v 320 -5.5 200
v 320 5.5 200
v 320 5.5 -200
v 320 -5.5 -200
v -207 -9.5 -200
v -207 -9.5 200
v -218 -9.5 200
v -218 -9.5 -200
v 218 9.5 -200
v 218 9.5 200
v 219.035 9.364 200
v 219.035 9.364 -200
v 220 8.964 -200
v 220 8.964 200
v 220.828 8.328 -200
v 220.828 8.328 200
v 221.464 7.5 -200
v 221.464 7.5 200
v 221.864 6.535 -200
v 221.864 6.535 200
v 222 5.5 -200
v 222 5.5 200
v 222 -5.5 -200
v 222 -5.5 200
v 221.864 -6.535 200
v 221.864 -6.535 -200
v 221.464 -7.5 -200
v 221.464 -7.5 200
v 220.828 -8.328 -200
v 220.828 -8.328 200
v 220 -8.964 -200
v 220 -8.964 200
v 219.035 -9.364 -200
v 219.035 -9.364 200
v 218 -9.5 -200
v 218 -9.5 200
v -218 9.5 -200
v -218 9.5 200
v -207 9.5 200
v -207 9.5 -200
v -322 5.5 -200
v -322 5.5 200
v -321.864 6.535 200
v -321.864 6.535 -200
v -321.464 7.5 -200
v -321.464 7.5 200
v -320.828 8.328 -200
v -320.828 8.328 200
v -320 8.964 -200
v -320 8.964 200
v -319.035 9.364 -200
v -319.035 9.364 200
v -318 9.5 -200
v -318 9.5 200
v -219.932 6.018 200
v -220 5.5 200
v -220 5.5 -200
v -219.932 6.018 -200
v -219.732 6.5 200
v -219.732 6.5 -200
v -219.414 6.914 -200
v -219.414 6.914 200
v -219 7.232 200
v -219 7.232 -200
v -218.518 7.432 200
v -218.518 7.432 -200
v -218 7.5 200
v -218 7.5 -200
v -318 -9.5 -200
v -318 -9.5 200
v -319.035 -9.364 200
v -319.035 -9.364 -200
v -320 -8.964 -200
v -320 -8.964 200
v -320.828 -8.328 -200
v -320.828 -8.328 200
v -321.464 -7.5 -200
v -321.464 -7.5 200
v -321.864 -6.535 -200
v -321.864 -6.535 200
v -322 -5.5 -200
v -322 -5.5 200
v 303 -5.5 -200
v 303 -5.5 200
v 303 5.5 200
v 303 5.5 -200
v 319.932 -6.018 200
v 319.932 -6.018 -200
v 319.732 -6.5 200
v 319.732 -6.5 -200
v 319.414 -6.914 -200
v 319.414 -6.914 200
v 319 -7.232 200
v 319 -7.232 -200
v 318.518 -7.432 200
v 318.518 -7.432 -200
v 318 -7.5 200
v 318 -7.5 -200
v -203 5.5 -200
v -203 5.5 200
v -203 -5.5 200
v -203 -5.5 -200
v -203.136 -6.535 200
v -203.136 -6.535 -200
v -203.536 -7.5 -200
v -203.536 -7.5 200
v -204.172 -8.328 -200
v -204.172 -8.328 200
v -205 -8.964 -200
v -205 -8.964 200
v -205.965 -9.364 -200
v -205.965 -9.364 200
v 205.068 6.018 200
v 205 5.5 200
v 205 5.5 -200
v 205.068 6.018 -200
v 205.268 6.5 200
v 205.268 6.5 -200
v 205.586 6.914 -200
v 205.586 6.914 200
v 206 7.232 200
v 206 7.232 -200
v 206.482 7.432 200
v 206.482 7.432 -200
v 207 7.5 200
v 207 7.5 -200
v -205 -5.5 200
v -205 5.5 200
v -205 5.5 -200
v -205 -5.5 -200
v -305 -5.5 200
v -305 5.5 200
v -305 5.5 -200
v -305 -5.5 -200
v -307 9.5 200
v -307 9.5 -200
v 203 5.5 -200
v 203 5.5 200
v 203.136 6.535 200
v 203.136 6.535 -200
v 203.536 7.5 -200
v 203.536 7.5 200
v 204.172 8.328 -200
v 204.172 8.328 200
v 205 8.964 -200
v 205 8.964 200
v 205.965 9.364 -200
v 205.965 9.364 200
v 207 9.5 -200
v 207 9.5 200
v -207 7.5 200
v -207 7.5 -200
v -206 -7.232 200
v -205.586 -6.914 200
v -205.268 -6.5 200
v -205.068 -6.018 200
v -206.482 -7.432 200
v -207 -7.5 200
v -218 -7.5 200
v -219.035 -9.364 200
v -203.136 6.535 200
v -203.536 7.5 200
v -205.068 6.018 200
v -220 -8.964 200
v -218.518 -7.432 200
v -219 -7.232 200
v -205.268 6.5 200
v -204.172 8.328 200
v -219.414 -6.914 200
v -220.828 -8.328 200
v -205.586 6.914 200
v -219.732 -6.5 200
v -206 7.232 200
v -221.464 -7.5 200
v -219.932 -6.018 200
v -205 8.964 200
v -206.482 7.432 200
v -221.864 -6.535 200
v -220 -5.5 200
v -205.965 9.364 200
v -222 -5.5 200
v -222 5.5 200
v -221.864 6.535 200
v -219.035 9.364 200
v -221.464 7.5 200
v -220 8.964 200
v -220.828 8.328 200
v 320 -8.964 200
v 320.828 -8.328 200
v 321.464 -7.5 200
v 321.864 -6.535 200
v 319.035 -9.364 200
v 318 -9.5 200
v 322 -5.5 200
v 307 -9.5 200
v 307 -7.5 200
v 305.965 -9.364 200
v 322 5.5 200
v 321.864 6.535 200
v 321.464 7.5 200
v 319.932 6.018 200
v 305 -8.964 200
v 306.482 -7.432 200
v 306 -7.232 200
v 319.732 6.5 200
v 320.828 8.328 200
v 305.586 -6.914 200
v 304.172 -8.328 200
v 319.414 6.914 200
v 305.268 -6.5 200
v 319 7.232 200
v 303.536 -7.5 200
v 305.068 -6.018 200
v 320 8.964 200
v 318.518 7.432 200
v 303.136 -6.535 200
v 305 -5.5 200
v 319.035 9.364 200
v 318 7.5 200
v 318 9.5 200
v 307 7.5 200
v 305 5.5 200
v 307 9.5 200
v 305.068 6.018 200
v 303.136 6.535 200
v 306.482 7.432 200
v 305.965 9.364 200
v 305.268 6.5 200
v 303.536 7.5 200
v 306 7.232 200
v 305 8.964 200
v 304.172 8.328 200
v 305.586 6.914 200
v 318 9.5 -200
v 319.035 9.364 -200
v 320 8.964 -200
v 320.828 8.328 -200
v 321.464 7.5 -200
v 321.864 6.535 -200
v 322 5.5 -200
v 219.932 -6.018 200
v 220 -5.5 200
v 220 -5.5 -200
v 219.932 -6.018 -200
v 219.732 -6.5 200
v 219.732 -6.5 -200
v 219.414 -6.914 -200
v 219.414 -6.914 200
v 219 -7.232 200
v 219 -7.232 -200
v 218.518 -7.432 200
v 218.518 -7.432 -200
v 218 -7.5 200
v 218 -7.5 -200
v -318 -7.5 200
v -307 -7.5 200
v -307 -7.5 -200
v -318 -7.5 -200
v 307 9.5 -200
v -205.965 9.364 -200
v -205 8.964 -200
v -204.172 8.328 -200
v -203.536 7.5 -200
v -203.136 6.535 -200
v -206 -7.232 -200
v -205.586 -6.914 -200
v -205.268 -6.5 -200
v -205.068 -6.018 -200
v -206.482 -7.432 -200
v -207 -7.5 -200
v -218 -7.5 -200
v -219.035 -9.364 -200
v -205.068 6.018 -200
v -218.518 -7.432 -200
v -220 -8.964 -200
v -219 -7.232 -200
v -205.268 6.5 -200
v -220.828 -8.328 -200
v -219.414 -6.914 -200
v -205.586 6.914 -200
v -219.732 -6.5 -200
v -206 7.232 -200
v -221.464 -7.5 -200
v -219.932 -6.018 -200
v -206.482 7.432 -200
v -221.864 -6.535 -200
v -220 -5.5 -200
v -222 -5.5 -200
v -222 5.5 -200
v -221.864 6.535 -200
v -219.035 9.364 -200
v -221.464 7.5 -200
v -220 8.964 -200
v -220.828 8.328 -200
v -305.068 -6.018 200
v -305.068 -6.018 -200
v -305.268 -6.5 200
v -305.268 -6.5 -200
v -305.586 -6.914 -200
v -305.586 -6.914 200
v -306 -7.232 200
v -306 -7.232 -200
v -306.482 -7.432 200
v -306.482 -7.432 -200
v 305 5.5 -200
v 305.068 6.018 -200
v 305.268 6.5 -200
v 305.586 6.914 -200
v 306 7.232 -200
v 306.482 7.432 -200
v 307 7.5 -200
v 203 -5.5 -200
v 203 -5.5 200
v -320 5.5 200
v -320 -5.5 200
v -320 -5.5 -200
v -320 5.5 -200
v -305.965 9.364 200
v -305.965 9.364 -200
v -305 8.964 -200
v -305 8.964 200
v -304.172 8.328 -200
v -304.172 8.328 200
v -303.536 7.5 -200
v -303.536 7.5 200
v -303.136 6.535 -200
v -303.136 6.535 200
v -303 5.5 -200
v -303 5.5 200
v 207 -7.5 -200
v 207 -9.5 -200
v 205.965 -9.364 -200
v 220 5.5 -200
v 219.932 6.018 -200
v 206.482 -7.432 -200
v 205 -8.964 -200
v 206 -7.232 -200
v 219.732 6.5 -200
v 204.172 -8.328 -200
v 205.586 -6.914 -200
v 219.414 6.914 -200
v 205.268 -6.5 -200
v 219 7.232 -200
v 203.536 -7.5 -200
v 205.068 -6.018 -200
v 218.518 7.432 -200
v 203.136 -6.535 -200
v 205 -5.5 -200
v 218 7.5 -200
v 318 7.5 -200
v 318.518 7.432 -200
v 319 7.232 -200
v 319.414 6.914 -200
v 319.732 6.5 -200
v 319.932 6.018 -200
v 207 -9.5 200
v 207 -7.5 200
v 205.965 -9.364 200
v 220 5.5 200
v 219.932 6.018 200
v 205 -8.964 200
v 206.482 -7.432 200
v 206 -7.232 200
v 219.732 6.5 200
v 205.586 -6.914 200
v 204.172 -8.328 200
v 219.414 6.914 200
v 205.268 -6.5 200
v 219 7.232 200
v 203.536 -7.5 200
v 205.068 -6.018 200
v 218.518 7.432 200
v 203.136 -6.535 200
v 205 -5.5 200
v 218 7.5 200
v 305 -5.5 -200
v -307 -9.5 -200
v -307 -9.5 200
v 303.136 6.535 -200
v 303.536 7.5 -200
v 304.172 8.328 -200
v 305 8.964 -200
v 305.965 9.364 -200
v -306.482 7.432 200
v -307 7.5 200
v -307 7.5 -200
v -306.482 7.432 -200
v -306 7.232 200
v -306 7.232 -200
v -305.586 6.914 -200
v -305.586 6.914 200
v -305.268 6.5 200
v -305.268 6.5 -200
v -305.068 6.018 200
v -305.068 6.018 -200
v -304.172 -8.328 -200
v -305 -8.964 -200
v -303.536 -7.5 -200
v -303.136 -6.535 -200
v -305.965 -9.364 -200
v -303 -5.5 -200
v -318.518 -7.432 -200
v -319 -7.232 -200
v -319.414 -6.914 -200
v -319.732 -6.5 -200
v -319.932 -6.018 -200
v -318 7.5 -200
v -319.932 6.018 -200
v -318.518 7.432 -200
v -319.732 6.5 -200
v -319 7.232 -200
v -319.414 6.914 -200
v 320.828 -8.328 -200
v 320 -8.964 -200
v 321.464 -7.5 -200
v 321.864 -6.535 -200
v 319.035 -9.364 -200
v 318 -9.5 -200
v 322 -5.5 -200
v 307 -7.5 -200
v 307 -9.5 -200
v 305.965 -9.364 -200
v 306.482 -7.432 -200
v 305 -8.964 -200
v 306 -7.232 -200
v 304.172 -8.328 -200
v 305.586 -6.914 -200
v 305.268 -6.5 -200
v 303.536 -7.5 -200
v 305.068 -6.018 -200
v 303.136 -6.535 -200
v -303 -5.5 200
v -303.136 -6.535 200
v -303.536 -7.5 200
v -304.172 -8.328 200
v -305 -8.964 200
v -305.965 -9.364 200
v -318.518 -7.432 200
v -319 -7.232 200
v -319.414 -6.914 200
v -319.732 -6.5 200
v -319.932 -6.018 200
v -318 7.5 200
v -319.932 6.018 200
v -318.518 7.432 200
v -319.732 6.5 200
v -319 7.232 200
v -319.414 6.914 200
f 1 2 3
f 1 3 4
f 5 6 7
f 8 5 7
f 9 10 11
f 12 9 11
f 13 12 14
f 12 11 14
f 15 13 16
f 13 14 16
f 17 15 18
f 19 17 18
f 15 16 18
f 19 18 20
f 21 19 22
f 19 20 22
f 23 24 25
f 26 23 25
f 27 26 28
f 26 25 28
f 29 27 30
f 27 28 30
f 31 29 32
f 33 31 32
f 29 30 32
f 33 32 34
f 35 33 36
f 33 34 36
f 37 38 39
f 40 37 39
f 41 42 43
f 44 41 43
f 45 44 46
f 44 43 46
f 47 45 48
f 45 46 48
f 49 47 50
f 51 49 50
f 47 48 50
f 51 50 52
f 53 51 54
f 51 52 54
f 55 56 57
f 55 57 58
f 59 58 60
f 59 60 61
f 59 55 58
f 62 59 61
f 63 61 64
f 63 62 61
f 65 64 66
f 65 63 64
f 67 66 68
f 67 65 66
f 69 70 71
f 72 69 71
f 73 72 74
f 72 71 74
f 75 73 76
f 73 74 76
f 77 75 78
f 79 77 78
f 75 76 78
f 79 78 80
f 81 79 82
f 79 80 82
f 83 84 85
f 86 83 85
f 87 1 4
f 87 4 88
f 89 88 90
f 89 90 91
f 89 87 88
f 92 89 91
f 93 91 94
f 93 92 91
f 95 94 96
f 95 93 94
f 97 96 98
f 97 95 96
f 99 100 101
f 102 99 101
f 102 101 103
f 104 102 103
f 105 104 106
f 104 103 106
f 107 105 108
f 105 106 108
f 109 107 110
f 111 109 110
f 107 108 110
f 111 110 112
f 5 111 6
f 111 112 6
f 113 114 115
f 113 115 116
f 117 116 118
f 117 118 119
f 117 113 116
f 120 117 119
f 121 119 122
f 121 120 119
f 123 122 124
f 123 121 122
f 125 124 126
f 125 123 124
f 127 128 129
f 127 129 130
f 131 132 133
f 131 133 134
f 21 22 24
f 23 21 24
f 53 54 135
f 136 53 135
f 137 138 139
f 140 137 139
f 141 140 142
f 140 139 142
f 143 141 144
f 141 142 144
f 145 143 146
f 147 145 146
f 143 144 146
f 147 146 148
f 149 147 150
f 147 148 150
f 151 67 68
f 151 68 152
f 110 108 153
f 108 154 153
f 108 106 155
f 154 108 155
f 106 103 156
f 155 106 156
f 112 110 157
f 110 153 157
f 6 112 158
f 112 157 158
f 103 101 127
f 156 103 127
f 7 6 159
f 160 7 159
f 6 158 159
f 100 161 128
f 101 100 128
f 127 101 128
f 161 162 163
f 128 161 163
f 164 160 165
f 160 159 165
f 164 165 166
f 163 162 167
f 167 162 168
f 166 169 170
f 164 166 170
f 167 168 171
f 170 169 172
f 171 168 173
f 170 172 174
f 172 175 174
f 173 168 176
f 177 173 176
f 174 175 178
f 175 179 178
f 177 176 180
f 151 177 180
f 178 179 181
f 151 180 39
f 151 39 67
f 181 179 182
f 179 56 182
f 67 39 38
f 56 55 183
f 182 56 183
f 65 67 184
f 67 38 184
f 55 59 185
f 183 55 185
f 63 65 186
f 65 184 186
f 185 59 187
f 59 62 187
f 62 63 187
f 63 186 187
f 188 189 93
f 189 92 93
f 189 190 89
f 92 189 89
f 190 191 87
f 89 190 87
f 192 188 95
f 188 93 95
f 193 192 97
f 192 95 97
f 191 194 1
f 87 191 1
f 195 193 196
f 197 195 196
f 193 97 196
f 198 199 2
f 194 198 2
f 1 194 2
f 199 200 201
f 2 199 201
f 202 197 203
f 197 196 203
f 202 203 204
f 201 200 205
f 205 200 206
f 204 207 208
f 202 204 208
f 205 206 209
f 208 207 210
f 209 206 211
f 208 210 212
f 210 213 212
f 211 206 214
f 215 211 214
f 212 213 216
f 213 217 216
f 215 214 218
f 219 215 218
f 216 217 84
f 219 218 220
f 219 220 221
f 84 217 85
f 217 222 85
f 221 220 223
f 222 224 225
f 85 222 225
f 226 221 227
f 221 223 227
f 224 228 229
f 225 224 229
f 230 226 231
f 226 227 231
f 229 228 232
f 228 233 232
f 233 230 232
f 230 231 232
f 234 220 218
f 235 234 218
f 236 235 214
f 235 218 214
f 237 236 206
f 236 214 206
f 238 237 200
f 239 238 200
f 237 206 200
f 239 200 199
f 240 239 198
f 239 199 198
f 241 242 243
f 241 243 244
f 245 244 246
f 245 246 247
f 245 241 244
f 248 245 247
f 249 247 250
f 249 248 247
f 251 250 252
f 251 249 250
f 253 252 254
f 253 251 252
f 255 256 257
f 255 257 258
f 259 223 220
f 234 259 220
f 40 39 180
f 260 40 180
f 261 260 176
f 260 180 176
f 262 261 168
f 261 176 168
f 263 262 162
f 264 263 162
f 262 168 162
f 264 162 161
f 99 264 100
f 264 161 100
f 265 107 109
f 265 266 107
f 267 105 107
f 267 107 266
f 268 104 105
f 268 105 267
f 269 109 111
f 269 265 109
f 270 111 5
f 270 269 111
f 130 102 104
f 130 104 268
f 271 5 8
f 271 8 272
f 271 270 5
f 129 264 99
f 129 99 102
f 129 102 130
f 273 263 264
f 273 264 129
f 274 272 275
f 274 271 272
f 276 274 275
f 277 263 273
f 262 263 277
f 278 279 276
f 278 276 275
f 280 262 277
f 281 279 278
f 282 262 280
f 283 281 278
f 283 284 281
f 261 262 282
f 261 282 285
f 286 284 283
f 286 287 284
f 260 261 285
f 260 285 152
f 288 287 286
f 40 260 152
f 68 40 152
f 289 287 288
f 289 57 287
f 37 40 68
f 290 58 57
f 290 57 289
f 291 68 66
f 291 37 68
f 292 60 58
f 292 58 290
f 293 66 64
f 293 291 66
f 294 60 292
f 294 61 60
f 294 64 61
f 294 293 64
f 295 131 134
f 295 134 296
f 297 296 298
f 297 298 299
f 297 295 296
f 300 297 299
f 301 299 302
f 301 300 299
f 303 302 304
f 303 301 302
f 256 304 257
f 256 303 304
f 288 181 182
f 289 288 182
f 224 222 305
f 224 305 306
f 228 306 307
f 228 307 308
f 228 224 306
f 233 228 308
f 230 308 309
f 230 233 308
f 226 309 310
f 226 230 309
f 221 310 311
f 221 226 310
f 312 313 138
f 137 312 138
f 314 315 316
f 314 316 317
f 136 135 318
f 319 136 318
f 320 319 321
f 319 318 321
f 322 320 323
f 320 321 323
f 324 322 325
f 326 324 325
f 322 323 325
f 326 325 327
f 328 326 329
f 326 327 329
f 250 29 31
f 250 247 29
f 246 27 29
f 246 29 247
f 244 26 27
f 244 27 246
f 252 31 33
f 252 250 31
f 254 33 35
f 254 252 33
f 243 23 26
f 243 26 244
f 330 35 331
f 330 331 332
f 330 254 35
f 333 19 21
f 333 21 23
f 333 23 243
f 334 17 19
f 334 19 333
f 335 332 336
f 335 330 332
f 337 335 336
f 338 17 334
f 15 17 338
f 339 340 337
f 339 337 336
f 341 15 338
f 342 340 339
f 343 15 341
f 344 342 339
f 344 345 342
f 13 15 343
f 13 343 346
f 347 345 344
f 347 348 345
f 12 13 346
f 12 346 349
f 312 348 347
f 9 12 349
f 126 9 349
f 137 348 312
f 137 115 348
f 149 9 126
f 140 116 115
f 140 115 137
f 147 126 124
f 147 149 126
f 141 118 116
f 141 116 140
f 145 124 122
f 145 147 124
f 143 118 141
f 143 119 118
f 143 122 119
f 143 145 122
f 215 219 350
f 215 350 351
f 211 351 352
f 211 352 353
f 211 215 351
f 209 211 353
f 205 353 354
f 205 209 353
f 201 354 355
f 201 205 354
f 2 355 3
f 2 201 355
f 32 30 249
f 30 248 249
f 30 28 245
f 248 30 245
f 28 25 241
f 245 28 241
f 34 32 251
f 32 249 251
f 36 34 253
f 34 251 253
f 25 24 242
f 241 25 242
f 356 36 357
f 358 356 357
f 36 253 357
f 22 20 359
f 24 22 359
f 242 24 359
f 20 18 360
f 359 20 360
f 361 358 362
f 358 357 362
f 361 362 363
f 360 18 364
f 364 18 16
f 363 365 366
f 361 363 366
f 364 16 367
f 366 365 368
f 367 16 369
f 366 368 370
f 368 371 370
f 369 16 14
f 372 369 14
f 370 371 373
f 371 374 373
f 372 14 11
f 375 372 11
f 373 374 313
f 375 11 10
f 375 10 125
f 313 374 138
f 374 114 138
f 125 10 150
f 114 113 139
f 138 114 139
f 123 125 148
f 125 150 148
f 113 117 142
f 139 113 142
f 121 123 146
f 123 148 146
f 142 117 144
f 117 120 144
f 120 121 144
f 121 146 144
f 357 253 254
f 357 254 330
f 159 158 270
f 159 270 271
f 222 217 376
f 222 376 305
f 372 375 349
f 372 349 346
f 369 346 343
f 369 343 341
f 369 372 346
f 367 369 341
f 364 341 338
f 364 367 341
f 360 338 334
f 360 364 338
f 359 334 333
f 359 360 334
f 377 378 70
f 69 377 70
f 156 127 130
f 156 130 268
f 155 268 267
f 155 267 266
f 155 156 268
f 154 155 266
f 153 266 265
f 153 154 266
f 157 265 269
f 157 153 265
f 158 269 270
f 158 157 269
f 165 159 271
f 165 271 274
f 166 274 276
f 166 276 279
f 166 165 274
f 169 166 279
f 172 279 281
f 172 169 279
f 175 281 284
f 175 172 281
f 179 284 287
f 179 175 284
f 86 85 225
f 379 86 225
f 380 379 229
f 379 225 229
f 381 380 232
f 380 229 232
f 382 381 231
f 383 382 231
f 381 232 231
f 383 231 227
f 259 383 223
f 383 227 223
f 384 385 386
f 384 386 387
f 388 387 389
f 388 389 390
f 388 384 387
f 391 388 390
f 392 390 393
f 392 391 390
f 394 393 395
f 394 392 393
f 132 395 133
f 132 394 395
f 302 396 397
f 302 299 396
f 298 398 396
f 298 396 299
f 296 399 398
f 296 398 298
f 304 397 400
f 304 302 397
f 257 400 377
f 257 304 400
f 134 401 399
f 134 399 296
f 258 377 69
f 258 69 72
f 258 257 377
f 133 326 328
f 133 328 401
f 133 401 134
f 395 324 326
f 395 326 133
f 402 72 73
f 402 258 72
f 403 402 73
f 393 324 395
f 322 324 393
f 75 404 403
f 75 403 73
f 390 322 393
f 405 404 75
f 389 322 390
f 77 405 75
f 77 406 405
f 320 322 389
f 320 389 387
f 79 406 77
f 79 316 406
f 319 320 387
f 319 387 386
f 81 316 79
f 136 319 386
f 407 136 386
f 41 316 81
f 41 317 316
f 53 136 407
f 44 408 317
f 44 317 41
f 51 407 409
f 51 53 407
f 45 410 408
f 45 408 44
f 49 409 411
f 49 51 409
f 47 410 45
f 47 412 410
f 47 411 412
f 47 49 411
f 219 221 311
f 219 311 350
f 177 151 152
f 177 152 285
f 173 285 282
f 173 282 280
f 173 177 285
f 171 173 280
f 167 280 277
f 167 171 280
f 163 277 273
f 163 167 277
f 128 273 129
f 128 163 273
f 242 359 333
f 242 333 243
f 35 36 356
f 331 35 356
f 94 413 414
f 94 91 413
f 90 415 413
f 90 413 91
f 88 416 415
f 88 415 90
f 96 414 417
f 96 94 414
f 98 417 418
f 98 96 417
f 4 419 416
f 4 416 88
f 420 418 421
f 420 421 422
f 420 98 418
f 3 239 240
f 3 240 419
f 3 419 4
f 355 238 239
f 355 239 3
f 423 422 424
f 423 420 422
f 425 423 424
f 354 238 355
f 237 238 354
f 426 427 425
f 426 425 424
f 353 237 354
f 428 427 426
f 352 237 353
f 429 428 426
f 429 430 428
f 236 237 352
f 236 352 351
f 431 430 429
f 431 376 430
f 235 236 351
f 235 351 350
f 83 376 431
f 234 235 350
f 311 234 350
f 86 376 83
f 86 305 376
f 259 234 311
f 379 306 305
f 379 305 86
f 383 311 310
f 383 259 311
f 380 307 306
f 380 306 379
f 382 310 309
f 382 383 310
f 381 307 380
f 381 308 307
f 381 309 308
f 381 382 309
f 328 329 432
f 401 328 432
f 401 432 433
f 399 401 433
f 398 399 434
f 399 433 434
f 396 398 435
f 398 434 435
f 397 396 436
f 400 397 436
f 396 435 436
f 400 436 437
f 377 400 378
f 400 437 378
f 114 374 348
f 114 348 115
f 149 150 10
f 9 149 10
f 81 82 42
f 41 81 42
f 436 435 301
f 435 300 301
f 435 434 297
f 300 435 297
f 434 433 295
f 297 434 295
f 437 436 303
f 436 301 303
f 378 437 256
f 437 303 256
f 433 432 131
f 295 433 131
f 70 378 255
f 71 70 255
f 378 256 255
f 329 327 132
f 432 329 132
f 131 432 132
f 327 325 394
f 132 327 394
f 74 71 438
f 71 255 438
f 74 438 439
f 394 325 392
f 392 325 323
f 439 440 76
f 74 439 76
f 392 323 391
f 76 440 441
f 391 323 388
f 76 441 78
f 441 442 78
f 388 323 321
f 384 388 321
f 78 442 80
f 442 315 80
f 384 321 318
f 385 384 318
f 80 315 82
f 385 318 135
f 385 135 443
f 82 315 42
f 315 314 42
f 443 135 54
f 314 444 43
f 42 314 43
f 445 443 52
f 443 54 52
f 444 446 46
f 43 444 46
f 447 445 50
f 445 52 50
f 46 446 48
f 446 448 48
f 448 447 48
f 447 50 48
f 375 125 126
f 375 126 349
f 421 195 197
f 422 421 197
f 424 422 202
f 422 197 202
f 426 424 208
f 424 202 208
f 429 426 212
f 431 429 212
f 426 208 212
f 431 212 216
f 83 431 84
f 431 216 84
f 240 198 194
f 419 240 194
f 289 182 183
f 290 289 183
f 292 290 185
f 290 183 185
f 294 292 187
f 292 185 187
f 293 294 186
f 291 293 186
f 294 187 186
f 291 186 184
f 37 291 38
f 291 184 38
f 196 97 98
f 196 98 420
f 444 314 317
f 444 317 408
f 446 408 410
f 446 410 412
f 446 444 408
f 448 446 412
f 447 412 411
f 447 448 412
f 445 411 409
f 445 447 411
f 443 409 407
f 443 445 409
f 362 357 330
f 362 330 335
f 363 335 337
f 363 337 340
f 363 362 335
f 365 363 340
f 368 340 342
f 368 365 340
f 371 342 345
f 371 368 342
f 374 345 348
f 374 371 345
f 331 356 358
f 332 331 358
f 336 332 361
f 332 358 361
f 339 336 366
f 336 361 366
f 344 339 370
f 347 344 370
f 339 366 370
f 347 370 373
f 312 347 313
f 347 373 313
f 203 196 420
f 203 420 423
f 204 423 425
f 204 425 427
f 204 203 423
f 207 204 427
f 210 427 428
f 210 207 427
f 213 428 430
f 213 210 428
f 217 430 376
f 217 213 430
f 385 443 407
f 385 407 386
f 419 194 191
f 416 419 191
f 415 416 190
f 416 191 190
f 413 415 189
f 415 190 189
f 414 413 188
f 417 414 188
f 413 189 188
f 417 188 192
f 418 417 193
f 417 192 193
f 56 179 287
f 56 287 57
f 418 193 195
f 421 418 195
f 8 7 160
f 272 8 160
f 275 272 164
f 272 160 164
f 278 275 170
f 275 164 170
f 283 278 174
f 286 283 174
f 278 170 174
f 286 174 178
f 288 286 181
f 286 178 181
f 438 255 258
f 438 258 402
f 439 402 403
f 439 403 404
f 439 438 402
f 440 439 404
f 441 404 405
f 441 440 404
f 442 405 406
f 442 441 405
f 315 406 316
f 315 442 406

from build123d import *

# Parameters (mm, degrees)
SQUARE_TUBE_20_X_20_X_2_2_DEPTH   = 400
SQUARE_TUBE_20_X_20_X_2_2_2_DEPTH = 400
SQUARE_TUBE_20_X_20_X_2_2_3_DEPTH = 400
SQUARE_TUBE_20_X_20_X_2_2_4_DEPTH = 400


with BuildPart() as part:
    # Sketch12 → Square tube 20 X 20 X 2(2) (new body)
    with BuildSketch(Plane(origin=(-312.5, 0, 200), x_dir=(-1, 0, 0), z_dir=(0, 0, -1))):
        with BuildLine():
            Line((-5.5, -9.5), (5.5, -9.5))
            ThreePointArc((5.5, -9.5), (8.328427125, -8.328427125), (9.5, -5.5))
            Line((9.5, -5.5), (9.5, 5.5))
            ThreePointArc((9.5, 5.5), (8.328427125, 8.328427125), (5.5, 9.5))
            Line((5.5, 9.5), (-5.5, 9.5))
            ThreePointArc((-5.5, 9.5), (-8.328427125, 8.328427125), (-9.5, 5.5))
            Line((-9.5, 5.5), (-9.5, -5.5))
            ThreePointArc((-9.5, -5.5), (-8.328427125, -8.328427125), (-5.5, -9.5))
        make_face()
        with BuildLine():
            Line((-5.5, -7.5), (5.5, -7.5))
            ThreePointArc((5.5, -7.5), (6.914213562, -6.914213562), (7.5, -5.5))
            Line((7.5, -5.5), (7.5, 5.5))
            ThreePointArc((7.5, 5.5), (6.914213562, 6.914213562), (5.5, 7.5))
            Line((5.5, 7.5), (-5.5, 7.5))
            ThreePointArc((-5.5, 7.5), (-6.914213562, 6.914213562), (-7.5, 5.5))
            Line((-7.5, 5.5), (-7.5, -5.5))
            ThreePointArc((-7.5, -5.5), (-6.914213562, -6.914213562), (-5.5, -7.5))
        make_face(mode=Mode.SUBTRACT)
    extrude(amount=SQUARE_TUBE_20_X_20_X_2_2_DEPTH)


with BuildPart() as body_2:
    # Sketch12 on segment 2 (carried to segment 2) → Square tube 20 X 20 X 2_2 2 (new body)
    with BuildSketch(Plane(origin=(-212.5, 0, 200), x_dir=(-1, 0, 0), z_dir=(0, 0, -1))):
        with BuildLine():
            Line((-5.5, -9.5), (5.5, -9.5))
            ThreePointArc((5.5, -9.5), (8.328427125, -8.328427125), (9.5, -5.5))
            Line((9.5, -5.5), (9.5, 5.5))
            ThreePointArc((9.5, 5.5), (8.328427125, 8.328427125), (5.5, 9.5))
            Line((5.5, 9.5), (-5.5, 9.5))
            ThreePointArc((-5.5, 9.5), (-8.328427125, 8.328427125), (-9.5, 5.5))
            Line((-9.5, 5.5), (-9.5, -5.5))
            ThreePointArc((-9.5, -5.5), (-8.328427125, -8.328427125), (-5.5, -9.5))
        make_face()
        with BuildLine():
            Line((-5.5, -7.5), (5.5, -7.5))
            ThreePointArc((5.5, -7.5), (6.914213562, -6.914213562), (7.5, -5.5))
            Line((7.5, -5.5), (7.5, 5.5))
            ThreePointArc((7.5, 5.5), (6.914213562, 6.914213562), (5.5, 7.5))
            Line((5.5, 7.5), (-5.5, 7.5))
            ThreePointArc((-5.5, 7.5), (-6.914213562, 6.914213562), (-7.5, 5.5))
            Line((-7.5, 5.5), (-7.5, -5.5))
            ThreePointArc((-7.5, -5.5), (-6.914213562, -6.914213562), (-5.5, -7.5))
        make_face(mode=Mode.SUBTRACT)
    extrude(amount=SQUARE_TUBE_20_X_20_X_2_2_2_DEPTH)


with BuildPart() as body_3:
    # Sketch12 on segment 3 (carried to segment 3) → Square tube 20 X 20 X 2_2 3 (new body)
    with BuildSketch(Plane(origin=(212.5, 0, 200), x_dir=(-1, 0, 0), z_dir=(0, 0, -1))):
        with BuildLine():
            Line((-5.5, -9.5), (5.5, -9.5))
            ThreePointArc((5.5, -9.5), (8.328427125, -8.328427125), (9.5, -5.5))
            Line((9.5, -5.5), (9.5, 5.5))
            ThreePointArc((9.5, 5.5), (8.328427125, 8.328427125), (5.5, 9.5))
            Line((5.5, 9.5), (-5.5, 9.5))
            ThreePointArc((-5.5, 9.5), (-8.328427125, 8.328427125), (-9.5, 5.5))
            Line((-9.5, 5.5), (-9.5, -5.5))
            ThreePointArc((-9.5, -5.5), (-8.328427125, -8.328427125), (-5.5, -9.5))
        make_face()
        with BuildLine():
            Line((-5.5, -7.5), (5.5, -7.5))
            ThreePointArc((5.5, -7.5), (6.914213562, -6.914213562), (7.5, -5.5))
            Line((7.5, -5.5), (7.5, 5.5))
            ThreePointArc((7.5, 5.5), (6.914213562, 6.914213562), (5.5, 7.5))
            Line((5.5, 7.5), (-5.5, 7.5))
            ThreePointArc((-5.5, 7.5), (-6.914213562, 6.914213562), (-7.5, 5.5))
            Line((-7.5, 5.5), (-7.5, -5.5))
            ThreePointArc((-7.5, -5.5), (-6.914213562, -6.914213562), (-5.5, -7.5))
        make_face(mode=Mode.SUBTRACT)
    extrude(amount=SQUARE_TUBE_20_X_20_X_2_2_3_DEPTH)


with BuildPart() as body_4:
    # Sketch12 on segment 4 (carried to segment 4) → Square tube 20 X 20 X 2_2 4 (new body)
    with BuildSketch(Plane(origin=(312.5, 0, 200), x_dir=(-1, 0, 0), z_dir=(0, 0, -1))):
        with BuildLine():
            Line((-5.5, -9.5), (5.5, -9.5))
            ThreePointArc((5.5, -9.5), (8.328427125, -8.328427125), (9.5, -5.5))
            Line((9.5, -5.5), (9.5, 5.5))
            ThreePointArc((9.5, 5.5), (8.328427125, 8.328427125), (5.5, 9.5))
            Line((5.5, 9.5), (-5.5, 9.5))
            ThreePointArc((-5.5, 9.5), (-8.328427125, 8.328427125), (-9.5, 5.5))
            Line((-9.5, 5.5), (-9.5, -5.5))
            ThreePointArc((-9.5, -5.5), (-8.328427125, -8.328427125), (-5.5, -9.5))
        make_face()
        with BuildLine():
            Line((-5.5, -7.5), (5.5, -7.5))
            ThreePointArc((5.5, -7.5), (6.914213562, -6.914213562), (7.5, -5.5))
            Line((7.5, -5.5), (7.5, 5.5))
            ThreePointArc((7.5, 5.5), (6.914213562, 6.914213562), (5.5, 7.5))
            Line((5.5, 7.5), (-5.5, 7.5))
            ThreePointArc((-5.5, 7.5), (-6.914213562, 6.914213562), (-7.5, 5.5))
            Line((-7.5, 5.5), (-7.5, -5.5))
            ThreePointArc((-7.5, -5.5), (-6.914213562, -6.914213562), (-5.5, -7.5))
        make_face(mode=Mode.SUBTRACT)
    extrude(amount=SQUARE_TUBE_20_X_20_X_2_2_4_DEPTH)


solid = Compound([part.part, body_2.part, body_3.part, body_4.part])
